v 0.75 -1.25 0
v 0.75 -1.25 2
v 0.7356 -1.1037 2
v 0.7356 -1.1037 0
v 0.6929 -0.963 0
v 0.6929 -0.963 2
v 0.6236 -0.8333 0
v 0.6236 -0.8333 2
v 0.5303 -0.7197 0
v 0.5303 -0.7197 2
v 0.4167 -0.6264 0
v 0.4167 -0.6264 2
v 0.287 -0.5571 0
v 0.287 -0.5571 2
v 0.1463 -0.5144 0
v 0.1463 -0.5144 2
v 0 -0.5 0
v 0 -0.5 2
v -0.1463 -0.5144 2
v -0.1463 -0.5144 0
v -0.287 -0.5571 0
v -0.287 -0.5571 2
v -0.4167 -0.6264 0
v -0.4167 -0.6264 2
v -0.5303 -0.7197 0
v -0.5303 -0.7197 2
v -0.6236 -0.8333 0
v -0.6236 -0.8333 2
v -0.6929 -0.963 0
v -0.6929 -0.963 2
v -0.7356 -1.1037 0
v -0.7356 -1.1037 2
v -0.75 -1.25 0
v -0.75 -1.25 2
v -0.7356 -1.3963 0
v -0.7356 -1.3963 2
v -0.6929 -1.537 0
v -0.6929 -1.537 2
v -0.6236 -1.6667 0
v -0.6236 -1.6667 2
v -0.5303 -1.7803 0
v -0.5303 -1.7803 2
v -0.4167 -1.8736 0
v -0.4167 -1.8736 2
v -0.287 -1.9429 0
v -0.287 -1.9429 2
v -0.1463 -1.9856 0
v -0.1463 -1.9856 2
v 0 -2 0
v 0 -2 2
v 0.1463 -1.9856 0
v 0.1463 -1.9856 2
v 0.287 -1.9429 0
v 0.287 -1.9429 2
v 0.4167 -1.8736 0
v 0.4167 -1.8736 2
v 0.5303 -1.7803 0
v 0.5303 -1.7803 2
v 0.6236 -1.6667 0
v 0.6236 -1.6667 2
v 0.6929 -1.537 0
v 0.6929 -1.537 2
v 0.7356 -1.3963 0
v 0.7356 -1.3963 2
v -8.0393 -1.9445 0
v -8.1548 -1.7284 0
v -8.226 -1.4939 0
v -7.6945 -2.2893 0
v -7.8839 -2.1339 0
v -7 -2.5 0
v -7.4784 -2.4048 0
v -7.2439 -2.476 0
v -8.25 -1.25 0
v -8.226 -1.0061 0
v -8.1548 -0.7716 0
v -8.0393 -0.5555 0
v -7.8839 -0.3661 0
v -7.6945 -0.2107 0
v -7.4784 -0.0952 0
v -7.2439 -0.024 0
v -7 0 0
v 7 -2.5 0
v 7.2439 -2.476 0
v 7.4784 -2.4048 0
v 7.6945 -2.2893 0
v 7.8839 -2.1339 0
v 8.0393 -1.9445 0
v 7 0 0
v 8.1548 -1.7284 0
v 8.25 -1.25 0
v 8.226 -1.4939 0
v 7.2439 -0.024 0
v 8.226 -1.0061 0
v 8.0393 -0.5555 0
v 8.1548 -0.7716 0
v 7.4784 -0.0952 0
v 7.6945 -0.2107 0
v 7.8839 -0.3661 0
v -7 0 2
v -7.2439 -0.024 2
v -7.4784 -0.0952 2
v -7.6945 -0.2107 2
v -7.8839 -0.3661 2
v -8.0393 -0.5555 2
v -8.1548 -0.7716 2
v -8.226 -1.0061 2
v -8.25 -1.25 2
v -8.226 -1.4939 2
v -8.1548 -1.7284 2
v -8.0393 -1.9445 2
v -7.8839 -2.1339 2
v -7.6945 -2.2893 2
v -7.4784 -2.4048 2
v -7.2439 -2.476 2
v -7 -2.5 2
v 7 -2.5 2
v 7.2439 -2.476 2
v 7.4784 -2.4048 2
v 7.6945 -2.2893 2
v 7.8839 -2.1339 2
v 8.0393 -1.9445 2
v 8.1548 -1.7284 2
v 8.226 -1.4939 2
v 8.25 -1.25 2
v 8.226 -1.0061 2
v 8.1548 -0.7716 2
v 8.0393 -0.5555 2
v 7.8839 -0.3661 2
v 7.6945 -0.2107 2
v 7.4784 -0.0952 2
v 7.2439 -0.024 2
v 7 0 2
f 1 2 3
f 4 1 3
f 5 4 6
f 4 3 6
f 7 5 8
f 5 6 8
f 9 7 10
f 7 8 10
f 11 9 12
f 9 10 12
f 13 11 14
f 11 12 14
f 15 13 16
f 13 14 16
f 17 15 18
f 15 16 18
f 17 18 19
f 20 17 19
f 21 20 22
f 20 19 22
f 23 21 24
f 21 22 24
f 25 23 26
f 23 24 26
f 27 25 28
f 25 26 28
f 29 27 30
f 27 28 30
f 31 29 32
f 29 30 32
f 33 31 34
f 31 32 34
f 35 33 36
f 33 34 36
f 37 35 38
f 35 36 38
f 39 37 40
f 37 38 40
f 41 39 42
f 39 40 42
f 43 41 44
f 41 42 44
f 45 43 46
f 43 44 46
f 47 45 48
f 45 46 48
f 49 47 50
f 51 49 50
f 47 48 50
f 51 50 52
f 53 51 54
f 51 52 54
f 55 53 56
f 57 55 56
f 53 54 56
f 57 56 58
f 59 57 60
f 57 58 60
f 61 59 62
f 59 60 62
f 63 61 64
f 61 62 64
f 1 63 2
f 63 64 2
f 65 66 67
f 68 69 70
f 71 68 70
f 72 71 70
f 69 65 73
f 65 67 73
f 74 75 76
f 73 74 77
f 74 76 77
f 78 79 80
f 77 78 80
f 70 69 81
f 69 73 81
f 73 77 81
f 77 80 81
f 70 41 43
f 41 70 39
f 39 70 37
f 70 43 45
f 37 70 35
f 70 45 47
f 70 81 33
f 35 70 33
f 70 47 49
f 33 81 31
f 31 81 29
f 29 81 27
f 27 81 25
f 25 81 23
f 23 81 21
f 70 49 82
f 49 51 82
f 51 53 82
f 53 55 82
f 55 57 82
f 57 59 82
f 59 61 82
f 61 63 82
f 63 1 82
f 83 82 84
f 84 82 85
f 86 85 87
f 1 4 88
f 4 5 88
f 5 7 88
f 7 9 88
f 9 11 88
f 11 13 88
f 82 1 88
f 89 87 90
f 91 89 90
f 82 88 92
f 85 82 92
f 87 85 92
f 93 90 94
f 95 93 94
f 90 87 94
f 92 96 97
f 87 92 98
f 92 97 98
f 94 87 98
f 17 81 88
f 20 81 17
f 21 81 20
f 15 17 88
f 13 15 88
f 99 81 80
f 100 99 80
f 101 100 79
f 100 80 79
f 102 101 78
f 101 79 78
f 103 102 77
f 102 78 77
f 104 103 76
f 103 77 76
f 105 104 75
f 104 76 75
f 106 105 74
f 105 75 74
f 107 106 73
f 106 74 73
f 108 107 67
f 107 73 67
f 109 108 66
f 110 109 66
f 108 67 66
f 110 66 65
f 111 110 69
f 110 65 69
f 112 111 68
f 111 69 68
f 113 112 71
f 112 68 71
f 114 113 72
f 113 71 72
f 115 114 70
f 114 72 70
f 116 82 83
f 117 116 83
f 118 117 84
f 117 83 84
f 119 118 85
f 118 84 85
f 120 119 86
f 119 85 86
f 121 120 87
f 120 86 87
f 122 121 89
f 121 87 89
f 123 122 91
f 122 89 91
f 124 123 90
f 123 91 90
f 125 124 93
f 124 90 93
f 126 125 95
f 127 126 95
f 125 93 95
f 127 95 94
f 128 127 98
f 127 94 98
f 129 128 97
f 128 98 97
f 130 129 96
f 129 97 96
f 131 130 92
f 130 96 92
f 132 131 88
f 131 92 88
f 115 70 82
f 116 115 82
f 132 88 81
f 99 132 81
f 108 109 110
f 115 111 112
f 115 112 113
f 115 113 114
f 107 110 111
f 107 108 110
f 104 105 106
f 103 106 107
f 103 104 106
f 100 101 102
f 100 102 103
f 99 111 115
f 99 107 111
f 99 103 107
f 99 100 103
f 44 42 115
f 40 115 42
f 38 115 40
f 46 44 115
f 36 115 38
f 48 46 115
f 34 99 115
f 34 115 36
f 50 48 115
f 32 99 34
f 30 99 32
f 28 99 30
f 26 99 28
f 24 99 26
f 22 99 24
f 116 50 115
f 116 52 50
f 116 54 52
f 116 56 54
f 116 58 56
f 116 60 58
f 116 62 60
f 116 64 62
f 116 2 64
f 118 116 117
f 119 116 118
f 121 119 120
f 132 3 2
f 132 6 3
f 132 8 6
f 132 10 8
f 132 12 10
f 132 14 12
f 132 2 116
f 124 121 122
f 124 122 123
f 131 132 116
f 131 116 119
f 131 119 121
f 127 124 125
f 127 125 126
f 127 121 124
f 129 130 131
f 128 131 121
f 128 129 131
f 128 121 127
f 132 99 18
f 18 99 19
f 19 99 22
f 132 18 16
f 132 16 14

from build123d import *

# Parameters (mm, degrees)
SALIENTE_EXTRUIR1_DEPTH = 2
CROQUIS2_R              = 0.75
CORTAR_EXTRUIR1_DEPTH   = 2


with BuildPart() as part:
    # Croquis1 → Saliente-Extruir1 (new body)
    with BuildSketch(Plane.XY):
        with BuildLine():
            Line((0, -2.5), (0, 0))
            Line((0, 0), (-7, 0))
            ThreePointArc((-7, 0), (-8.25, -1.25), (-7, -2.5))
            Line((-7, -2.5), (0, -2.5))
        make_face()
        with BuildLine():
            Line((7, 0), (0, 0))
            Line((0, 0), (0, -2.5))
            Line((0, -2.5), (7, -2.5))
            ThreePointArc((7, -2.5), (8.25, -1.25), (7, 0))
        make_face()
    extrude(amount=SALIENTE_EXTRUIR1_DEPTH)

    # Croquis2 → Cortar-Extruir1 (cut)
    with BuildSketch(Plane.XY.offset(2)):
        with Locations((0, -1.25)):
            Circle(CROQUIS2_R)
    extrude(amount=-CORTAR_EXTRUIR1_DEPTH, mode=Mode.SUBTRACT)


solid = part.part
